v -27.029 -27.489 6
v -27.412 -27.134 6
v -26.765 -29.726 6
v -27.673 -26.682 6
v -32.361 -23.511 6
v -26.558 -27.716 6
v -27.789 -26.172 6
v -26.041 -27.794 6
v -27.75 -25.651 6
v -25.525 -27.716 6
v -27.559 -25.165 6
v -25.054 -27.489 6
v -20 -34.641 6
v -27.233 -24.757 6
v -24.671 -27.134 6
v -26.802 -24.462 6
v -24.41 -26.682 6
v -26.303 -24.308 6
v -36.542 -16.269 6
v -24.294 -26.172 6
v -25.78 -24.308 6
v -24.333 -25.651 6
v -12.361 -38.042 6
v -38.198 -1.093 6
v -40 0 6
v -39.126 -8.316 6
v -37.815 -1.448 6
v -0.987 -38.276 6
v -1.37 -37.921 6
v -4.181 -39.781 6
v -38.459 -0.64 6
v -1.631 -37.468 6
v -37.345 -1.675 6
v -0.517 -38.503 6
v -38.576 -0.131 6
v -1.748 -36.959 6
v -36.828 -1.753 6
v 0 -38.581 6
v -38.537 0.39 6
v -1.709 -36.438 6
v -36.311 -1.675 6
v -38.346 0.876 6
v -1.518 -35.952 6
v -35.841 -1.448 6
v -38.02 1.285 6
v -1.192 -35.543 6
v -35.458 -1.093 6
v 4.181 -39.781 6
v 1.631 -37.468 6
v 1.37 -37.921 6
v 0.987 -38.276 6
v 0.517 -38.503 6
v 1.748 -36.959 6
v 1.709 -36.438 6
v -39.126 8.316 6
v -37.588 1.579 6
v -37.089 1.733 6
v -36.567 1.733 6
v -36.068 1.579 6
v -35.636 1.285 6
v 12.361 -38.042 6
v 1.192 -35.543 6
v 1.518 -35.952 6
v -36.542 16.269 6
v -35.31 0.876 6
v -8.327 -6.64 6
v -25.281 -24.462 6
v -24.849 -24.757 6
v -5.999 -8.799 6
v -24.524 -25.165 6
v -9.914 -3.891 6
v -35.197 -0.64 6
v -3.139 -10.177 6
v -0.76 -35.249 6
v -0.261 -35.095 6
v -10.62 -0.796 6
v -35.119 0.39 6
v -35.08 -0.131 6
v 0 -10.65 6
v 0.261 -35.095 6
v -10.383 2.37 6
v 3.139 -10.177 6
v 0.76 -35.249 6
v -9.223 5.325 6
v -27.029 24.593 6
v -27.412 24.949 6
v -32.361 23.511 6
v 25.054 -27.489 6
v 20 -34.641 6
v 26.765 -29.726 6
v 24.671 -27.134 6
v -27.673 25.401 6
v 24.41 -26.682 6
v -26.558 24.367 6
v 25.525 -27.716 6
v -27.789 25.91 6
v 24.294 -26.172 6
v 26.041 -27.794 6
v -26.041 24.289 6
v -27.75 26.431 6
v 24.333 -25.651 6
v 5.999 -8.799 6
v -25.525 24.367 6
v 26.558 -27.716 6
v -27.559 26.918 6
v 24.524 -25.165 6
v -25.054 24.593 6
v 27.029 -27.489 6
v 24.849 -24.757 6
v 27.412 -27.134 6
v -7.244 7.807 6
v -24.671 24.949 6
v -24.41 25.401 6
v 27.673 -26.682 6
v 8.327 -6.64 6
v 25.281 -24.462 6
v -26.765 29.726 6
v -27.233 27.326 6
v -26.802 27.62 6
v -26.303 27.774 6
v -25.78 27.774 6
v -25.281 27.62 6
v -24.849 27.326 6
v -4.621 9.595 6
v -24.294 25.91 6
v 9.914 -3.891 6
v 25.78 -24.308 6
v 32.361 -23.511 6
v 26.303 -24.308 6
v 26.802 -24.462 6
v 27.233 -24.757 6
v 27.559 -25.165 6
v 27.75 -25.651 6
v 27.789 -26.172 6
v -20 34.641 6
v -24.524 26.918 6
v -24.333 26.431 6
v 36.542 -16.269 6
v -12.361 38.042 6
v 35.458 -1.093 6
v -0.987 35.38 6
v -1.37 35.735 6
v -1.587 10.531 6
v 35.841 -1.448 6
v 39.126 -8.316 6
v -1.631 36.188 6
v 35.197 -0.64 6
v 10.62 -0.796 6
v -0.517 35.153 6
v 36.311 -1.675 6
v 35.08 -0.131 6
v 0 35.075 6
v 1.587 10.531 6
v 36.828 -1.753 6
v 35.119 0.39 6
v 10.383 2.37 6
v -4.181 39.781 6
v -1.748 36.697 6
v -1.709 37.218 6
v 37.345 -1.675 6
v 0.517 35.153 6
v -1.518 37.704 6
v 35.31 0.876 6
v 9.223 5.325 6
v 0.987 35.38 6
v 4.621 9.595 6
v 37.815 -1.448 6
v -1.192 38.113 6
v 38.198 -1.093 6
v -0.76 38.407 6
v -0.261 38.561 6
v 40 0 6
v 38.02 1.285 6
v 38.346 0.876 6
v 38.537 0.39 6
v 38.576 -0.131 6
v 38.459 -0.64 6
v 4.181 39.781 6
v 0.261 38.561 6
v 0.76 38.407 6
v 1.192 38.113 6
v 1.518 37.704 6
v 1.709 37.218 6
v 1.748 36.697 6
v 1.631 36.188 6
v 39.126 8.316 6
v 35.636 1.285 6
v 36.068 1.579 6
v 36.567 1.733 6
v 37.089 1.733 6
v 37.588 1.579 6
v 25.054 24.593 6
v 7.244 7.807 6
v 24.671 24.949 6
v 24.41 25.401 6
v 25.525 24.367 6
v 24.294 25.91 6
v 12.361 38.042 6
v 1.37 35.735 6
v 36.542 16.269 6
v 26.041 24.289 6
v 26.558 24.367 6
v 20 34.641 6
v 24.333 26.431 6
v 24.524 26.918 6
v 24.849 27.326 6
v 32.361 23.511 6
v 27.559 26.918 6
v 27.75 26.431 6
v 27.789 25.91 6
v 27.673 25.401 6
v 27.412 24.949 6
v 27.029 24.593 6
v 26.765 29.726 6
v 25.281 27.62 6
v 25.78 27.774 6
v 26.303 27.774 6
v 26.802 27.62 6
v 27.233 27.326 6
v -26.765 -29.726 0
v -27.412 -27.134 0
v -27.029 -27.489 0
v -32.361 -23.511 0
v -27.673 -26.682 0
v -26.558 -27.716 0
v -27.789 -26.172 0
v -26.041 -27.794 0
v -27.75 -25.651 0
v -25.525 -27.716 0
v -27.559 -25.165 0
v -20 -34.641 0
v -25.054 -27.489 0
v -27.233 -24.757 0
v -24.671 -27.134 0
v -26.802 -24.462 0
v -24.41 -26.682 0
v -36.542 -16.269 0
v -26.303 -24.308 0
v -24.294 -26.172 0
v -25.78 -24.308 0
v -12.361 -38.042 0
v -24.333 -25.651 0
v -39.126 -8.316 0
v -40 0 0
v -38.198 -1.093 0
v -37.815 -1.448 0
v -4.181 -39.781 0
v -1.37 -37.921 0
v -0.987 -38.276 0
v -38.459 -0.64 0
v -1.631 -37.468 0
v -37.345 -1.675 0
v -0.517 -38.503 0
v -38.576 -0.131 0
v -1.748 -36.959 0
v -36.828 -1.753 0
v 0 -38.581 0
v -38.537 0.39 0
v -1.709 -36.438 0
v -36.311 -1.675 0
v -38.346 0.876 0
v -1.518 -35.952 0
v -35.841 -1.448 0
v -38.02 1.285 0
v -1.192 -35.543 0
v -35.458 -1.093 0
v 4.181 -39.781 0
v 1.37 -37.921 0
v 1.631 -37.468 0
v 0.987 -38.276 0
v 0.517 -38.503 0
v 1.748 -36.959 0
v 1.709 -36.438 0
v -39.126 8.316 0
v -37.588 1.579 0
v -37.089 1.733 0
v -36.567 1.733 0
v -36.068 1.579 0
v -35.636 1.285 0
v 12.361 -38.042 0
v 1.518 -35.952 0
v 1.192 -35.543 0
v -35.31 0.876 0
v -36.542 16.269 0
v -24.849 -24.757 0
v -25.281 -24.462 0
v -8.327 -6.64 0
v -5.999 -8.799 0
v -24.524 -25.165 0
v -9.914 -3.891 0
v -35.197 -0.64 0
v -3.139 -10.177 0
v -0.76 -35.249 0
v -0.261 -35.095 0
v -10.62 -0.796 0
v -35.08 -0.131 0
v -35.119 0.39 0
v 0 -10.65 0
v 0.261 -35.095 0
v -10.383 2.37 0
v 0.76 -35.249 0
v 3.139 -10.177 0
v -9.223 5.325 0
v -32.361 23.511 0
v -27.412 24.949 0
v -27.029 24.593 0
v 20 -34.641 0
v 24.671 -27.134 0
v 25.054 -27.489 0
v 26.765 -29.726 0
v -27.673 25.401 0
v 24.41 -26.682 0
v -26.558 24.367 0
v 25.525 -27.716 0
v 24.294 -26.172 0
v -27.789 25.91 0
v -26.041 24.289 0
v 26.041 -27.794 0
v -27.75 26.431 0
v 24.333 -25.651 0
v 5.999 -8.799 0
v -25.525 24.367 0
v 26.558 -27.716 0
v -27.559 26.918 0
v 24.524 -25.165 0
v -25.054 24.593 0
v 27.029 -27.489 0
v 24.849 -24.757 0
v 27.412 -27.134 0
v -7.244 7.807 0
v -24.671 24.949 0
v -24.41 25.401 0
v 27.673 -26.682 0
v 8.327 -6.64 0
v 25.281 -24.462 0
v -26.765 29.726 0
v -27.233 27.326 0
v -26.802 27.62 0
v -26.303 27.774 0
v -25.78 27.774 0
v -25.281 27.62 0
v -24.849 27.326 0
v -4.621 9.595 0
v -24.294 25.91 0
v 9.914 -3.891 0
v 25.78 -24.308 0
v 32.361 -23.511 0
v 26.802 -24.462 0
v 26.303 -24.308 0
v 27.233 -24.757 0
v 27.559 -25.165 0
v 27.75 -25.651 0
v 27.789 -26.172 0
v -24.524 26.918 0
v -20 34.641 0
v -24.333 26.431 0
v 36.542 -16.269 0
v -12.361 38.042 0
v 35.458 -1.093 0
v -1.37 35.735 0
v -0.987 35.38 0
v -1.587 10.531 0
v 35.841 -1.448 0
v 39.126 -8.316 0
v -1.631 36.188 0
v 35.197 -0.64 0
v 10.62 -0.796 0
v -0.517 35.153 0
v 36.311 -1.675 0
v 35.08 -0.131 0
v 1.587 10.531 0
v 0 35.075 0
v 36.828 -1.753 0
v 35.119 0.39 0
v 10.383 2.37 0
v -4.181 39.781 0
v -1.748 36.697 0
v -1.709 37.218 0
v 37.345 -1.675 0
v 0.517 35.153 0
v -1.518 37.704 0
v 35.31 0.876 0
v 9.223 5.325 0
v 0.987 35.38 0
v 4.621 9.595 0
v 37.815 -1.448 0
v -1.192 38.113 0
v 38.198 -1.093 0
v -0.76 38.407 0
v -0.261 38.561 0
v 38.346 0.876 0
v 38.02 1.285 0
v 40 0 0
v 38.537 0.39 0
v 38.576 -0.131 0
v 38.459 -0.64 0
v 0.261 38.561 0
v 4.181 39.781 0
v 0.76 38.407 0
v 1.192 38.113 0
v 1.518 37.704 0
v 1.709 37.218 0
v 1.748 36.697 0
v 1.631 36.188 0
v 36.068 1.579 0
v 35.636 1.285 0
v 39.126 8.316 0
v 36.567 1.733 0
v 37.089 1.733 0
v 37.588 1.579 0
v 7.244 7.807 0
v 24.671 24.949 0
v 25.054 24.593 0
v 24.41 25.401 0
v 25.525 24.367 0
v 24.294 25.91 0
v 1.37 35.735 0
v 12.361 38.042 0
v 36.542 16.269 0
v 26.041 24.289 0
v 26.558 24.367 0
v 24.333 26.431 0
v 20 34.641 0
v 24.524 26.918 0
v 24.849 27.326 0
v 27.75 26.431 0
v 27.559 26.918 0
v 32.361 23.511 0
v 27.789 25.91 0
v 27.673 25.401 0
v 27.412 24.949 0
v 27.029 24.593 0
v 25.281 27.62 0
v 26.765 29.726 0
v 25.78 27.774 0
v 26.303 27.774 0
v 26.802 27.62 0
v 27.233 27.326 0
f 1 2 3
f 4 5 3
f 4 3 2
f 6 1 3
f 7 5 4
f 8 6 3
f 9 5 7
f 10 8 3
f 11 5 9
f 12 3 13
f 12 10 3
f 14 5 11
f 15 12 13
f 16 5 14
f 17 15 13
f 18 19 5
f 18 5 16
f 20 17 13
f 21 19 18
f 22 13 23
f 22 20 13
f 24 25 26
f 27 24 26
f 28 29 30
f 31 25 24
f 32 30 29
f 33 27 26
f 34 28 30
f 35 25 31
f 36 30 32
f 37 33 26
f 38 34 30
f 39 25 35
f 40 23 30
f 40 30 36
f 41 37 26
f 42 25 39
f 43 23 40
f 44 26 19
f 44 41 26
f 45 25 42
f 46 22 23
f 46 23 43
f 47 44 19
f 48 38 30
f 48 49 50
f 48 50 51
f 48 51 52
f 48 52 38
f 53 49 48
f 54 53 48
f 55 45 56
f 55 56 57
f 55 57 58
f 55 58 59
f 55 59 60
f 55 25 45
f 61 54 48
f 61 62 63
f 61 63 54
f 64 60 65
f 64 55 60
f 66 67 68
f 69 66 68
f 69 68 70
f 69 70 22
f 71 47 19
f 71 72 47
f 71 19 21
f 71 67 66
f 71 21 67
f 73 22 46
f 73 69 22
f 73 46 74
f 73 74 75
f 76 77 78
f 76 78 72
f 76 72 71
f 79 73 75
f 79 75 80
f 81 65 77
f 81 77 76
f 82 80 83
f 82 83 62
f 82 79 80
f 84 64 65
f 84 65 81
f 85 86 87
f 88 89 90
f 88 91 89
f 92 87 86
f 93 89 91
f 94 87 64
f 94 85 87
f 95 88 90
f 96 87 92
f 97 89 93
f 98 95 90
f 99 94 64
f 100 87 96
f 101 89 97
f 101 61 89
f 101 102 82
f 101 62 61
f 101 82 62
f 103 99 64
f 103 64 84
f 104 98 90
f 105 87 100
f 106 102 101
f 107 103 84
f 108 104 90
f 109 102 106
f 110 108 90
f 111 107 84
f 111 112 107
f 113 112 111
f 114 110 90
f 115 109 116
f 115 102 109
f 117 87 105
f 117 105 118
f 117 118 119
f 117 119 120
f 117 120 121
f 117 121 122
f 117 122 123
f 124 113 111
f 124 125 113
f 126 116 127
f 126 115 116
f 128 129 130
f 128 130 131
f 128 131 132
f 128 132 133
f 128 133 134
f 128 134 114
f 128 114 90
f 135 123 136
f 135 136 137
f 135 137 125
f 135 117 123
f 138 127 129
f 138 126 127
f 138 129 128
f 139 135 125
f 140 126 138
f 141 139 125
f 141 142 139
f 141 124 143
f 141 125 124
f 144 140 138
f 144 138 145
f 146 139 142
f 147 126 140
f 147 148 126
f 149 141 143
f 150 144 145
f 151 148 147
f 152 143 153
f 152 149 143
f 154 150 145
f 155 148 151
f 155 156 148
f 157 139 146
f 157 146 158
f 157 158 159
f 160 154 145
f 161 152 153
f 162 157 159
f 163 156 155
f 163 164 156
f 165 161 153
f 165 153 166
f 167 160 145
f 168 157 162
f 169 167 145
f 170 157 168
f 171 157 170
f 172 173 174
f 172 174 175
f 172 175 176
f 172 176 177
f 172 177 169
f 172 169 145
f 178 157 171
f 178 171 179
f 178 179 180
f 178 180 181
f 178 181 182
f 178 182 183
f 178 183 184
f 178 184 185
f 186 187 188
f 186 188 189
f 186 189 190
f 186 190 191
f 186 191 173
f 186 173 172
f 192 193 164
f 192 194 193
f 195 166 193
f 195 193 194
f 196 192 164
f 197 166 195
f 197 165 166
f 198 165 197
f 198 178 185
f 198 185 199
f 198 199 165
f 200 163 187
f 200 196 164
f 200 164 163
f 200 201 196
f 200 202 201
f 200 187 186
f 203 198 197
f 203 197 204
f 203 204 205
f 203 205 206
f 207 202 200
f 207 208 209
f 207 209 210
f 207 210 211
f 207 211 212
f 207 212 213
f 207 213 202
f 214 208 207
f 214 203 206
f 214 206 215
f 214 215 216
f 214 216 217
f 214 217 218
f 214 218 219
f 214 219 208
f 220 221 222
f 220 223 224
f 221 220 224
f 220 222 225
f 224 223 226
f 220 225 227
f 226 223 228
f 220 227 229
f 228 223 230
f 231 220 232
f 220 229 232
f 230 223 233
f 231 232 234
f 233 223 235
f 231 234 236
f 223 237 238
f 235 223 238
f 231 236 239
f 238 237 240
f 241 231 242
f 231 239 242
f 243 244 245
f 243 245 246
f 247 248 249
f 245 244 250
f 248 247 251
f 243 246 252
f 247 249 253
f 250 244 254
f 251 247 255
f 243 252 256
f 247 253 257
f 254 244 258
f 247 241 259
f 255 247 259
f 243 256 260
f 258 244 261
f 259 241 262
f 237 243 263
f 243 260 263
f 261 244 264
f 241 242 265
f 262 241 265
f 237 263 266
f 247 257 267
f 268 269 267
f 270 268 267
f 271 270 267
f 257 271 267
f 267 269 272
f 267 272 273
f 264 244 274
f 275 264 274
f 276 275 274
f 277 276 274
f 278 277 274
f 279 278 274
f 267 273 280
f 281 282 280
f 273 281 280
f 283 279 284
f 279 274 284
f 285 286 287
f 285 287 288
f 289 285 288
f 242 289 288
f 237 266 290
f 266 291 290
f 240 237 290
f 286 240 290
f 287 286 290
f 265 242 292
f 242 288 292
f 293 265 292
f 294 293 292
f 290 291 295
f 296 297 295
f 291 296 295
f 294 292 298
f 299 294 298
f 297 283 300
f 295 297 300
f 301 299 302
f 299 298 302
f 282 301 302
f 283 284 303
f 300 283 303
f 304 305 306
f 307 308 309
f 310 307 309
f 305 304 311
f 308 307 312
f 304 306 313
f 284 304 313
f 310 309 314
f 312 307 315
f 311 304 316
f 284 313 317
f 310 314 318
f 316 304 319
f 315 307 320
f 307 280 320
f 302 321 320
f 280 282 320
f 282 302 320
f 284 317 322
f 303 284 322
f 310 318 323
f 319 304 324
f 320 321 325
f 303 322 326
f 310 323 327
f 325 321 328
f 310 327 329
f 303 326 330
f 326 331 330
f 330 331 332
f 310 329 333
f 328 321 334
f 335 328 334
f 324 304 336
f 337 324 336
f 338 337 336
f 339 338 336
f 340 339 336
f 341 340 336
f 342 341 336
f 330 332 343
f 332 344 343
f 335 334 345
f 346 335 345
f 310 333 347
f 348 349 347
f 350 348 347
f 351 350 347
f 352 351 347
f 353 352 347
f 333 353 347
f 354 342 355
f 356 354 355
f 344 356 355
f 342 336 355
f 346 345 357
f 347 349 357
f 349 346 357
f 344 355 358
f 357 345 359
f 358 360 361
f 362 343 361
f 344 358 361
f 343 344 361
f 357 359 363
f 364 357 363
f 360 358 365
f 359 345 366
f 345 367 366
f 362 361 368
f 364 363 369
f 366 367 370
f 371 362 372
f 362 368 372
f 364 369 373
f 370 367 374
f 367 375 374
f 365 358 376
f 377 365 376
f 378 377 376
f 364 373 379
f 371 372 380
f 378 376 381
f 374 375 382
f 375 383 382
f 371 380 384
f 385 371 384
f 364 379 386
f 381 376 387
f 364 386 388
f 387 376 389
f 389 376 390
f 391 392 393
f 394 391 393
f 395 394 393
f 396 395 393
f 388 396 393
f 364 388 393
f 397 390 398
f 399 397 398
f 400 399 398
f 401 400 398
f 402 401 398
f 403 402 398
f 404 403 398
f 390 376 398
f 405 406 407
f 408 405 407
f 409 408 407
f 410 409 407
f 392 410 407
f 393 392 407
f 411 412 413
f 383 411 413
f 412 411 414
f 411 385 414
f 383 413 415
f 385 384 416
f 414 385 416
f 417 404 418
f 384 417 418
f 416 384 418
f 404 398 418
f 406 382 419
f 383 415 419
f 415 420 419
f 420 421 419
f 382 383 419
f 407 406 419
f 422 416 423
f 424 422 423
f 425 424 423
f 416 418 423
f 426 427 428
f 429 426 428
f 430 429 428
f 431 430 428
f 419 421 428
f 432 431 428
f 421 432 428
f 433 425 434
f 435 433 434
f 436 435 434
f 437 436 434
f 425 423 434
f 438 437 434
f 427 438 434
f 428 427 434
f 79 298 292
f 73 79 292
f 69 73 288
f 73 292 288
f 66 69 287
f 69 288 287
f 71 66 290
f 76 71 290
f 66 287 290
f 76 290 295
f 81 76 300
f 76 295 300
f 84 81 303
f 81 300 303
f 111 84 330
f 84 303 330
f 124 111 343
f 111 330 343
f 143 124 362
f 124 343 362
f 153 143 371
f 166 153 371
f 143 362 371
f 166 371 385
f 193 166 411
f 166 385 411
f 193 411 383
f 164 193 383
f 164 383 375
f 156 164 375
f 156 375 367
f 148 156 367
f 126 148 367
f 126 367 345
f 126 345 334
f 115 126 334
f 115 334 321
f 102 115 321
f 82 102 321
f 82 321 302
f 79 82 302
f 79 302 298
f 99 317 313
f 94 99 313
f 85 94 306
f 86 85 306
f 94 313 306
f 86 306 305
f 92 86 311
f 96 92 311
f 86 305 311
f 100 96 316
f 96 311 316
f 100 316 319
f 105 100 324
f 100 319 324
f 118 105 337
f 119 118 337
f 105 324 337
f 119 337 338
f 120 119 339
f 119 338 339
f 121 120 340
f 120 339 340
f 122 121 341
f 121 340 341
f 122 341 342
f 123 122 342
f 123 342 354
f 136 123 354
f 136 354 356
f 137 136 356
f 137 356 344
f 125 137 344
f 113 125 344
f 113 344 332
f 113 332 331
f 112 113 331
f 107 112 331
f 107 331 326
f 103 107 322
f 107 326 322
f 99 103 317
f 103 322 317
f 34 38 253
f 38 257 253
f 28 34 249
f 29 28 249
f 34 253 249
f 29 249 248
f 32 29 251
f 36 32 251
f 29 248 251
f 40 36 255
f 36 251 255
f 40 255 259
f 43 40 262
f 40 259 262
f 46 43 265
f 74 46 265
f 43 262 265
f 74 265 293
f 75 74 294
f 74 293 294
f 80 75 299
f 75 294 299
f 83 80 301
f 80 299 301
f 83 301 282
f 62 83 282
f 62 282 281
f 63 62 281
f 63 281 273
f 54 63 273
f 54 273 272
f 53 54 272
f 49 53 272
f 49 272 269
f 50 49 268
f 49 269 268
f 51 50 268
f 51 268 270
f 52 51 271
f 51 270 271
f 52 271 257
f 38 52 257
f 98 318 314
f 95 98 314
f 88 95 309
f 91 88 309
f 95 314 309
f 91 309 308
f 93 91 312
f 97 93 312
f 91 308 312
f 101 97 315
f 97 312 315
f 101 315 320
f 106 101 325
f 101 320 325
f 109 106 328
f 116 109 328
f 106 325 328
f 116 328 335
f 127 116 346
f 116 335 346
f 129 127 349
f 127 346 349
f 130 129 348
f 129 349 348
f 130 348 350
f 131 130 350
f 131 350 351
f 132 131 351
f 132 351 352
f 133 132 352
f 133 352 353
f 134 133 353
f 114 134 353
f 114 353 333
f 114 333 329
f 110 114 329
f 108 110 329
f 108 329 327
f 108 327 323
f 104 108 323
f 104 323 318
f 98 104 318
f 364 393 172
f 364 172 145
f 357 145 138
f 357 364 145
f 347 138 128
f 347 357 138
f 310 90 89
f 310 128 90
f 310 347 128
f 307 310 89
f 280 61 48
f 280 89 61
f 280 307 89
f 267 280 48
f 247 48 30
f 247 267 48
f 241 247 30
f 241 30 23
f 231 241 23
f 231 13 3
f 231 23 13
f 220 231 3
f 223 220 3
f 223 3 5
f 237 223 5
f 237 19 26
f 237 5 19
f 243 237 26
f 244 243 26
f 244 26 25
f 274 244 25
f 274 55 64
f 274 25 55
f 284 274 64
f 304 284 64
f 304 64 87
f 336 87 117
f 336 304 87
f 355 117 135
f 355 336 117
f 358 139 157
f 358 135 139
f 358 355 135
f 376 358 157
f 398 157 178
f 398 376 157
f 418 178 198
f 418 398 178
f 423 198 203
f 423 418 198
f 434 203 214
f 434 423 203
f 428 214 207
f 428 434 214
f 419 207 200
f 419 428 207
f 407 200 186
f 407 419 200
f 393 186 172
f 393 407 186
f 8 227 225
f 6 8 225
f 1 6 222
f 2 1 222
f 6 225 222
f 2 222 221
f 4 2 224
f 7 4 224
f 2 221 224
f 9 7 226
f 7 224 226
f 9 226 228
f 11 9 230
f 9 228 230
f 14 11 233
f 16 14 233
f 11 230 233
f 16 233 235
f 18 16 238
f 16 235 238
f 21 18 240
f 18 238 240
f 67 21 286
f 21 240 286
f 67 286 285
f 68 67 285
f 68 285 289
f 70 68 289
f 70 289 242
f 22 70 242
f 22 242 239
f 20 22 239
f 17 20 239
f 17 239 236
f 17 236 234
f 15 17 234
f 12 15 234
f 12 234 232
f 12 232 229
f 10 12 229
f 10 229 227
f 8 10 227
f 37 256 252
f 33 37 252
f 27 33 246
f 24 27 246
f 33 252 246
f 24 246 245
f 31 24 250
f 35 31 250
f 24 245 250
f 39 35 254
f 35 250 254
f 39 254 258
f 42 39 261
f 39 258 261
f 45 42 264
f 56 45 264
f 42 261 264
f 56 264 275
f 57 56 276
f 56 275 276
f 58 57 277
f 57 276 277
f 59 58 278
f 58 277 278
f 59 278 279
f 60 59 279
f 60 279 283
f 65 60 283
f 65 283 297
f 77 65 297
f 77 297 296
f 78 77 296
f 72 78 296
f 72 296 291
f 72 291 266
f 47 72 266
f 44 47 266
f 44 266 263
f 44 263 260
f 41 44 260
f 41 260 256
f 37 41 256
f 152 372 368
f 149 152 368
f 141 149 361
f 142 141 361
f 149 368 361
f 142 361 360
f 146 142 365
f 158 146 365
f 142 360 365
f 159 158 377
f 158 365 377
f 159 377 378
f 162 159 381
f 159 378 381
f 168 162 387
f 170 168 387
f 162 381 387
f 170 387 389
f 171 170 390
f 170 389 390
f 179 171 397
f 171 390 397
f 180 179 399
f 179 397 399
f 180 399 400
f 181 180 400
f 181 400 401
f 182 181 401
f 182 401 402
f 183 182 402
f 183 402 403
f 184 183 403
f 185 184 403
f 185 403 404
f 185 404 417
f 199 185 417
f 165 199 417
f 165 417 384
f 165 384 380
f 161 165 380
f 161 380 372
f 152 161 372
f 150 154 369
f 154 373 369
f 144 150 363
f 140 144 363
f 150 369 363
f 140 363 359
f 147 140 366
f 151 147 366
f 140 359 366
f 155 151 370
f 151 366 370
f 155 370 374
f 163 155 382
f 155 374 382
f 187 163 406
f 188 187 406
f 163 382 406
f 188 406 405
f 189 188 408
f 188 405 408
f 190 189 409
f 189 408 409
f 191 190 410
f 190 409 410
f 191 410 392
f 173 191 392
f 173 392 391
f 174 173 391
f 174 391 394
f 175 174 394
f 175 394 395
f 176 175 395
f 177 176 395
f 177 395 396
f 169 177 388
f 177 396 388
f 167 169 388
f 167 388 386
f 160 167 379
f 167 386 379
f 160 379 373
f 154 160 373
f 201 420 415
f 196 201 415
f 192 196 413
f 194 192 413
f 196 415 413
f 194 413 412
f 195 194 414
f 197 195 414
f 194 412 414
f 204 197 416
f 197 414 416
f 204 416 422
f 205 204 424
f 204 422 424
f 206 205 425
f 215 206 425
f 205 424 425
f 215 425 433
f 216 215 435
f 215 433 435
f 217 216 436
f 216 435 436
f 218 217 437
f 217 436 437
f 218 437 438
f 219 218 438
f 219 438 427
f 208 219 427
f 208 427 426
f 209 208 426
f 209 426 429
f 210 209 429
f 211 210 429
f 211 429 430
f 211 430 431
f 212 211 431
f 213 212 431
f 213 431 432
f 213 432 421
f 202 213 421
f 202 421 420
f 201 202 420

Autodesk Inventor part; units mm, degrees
ref_plane "YZ Plane" through (0, 0, 0) normal (1, 0, 0) x (0, 1, 0)
ref_plane "XZ Plane" through (0, 0, 0) normal (0, 1, 0) x (-1, 0, 0)
ref_plane "XY Plane" through (0, 0, 0) normal (0, 0, 1) x (1, 0, 0)
sketch "Sketch1" plane through (0, 0, 0) normal (0, 0, 1) x (1, 0, 0)
  circle A0 centre (0, 0) radius 40
  dimension "d47" = 80
extrude "Extrusion1" add sketch "Sketch1" along normal blind 6
sketch "Sketch7" plane through (0, 0, 6) normal (0, 0, 1) x (1, 0, 0)
  circle A0 centre (0, 0) radius 40 projected
  circle A1 centre (-36.828, 0) radius 1.5
  circle A2 centre (-26.0413, -26.0413) radius 1.5
  circle A3 centre (0, -36.828) radius 1.5
  circle A4 centre (26.0413, -26.0413) radius 1.5
  circle A5 centre (36.828, 0) radius 1.5
  circle A6 centre (26.0413, 26.0413) radius 1.5
  circle A7 centre (0, 36.828) radius 1.5
  circle A8 centre (-26.0413, 26.0413) radius 1.5
  dimension "d48" = 3
  dimension "d49" = 36.828
  dimension "d52" = 360
hole "Hole2" at (-26.0413, 26.0413, 6) at (0, 36.828, 6) at (26.0413, 26.0413, 6) at (36.828, 0, 6) at (26.0413, -26.0413, 6) at (0, -36.828, 6) at (-26.0413, -26.0413, 6) at (-36.828, 0, 6) direction (0, 0, -1) diameter 3.5052 end through all
sketch "Sketch8" plane through (0, 0, 6) normal (0, 0, 1) x (1, 0, 0)
  point P0 (0, 0)
  point P1 (0, 0)
hole "Hole3" at (0, 0, 6) direction (0, 0, -1) diameter 21.3 end through all
properties part number "Cover"
